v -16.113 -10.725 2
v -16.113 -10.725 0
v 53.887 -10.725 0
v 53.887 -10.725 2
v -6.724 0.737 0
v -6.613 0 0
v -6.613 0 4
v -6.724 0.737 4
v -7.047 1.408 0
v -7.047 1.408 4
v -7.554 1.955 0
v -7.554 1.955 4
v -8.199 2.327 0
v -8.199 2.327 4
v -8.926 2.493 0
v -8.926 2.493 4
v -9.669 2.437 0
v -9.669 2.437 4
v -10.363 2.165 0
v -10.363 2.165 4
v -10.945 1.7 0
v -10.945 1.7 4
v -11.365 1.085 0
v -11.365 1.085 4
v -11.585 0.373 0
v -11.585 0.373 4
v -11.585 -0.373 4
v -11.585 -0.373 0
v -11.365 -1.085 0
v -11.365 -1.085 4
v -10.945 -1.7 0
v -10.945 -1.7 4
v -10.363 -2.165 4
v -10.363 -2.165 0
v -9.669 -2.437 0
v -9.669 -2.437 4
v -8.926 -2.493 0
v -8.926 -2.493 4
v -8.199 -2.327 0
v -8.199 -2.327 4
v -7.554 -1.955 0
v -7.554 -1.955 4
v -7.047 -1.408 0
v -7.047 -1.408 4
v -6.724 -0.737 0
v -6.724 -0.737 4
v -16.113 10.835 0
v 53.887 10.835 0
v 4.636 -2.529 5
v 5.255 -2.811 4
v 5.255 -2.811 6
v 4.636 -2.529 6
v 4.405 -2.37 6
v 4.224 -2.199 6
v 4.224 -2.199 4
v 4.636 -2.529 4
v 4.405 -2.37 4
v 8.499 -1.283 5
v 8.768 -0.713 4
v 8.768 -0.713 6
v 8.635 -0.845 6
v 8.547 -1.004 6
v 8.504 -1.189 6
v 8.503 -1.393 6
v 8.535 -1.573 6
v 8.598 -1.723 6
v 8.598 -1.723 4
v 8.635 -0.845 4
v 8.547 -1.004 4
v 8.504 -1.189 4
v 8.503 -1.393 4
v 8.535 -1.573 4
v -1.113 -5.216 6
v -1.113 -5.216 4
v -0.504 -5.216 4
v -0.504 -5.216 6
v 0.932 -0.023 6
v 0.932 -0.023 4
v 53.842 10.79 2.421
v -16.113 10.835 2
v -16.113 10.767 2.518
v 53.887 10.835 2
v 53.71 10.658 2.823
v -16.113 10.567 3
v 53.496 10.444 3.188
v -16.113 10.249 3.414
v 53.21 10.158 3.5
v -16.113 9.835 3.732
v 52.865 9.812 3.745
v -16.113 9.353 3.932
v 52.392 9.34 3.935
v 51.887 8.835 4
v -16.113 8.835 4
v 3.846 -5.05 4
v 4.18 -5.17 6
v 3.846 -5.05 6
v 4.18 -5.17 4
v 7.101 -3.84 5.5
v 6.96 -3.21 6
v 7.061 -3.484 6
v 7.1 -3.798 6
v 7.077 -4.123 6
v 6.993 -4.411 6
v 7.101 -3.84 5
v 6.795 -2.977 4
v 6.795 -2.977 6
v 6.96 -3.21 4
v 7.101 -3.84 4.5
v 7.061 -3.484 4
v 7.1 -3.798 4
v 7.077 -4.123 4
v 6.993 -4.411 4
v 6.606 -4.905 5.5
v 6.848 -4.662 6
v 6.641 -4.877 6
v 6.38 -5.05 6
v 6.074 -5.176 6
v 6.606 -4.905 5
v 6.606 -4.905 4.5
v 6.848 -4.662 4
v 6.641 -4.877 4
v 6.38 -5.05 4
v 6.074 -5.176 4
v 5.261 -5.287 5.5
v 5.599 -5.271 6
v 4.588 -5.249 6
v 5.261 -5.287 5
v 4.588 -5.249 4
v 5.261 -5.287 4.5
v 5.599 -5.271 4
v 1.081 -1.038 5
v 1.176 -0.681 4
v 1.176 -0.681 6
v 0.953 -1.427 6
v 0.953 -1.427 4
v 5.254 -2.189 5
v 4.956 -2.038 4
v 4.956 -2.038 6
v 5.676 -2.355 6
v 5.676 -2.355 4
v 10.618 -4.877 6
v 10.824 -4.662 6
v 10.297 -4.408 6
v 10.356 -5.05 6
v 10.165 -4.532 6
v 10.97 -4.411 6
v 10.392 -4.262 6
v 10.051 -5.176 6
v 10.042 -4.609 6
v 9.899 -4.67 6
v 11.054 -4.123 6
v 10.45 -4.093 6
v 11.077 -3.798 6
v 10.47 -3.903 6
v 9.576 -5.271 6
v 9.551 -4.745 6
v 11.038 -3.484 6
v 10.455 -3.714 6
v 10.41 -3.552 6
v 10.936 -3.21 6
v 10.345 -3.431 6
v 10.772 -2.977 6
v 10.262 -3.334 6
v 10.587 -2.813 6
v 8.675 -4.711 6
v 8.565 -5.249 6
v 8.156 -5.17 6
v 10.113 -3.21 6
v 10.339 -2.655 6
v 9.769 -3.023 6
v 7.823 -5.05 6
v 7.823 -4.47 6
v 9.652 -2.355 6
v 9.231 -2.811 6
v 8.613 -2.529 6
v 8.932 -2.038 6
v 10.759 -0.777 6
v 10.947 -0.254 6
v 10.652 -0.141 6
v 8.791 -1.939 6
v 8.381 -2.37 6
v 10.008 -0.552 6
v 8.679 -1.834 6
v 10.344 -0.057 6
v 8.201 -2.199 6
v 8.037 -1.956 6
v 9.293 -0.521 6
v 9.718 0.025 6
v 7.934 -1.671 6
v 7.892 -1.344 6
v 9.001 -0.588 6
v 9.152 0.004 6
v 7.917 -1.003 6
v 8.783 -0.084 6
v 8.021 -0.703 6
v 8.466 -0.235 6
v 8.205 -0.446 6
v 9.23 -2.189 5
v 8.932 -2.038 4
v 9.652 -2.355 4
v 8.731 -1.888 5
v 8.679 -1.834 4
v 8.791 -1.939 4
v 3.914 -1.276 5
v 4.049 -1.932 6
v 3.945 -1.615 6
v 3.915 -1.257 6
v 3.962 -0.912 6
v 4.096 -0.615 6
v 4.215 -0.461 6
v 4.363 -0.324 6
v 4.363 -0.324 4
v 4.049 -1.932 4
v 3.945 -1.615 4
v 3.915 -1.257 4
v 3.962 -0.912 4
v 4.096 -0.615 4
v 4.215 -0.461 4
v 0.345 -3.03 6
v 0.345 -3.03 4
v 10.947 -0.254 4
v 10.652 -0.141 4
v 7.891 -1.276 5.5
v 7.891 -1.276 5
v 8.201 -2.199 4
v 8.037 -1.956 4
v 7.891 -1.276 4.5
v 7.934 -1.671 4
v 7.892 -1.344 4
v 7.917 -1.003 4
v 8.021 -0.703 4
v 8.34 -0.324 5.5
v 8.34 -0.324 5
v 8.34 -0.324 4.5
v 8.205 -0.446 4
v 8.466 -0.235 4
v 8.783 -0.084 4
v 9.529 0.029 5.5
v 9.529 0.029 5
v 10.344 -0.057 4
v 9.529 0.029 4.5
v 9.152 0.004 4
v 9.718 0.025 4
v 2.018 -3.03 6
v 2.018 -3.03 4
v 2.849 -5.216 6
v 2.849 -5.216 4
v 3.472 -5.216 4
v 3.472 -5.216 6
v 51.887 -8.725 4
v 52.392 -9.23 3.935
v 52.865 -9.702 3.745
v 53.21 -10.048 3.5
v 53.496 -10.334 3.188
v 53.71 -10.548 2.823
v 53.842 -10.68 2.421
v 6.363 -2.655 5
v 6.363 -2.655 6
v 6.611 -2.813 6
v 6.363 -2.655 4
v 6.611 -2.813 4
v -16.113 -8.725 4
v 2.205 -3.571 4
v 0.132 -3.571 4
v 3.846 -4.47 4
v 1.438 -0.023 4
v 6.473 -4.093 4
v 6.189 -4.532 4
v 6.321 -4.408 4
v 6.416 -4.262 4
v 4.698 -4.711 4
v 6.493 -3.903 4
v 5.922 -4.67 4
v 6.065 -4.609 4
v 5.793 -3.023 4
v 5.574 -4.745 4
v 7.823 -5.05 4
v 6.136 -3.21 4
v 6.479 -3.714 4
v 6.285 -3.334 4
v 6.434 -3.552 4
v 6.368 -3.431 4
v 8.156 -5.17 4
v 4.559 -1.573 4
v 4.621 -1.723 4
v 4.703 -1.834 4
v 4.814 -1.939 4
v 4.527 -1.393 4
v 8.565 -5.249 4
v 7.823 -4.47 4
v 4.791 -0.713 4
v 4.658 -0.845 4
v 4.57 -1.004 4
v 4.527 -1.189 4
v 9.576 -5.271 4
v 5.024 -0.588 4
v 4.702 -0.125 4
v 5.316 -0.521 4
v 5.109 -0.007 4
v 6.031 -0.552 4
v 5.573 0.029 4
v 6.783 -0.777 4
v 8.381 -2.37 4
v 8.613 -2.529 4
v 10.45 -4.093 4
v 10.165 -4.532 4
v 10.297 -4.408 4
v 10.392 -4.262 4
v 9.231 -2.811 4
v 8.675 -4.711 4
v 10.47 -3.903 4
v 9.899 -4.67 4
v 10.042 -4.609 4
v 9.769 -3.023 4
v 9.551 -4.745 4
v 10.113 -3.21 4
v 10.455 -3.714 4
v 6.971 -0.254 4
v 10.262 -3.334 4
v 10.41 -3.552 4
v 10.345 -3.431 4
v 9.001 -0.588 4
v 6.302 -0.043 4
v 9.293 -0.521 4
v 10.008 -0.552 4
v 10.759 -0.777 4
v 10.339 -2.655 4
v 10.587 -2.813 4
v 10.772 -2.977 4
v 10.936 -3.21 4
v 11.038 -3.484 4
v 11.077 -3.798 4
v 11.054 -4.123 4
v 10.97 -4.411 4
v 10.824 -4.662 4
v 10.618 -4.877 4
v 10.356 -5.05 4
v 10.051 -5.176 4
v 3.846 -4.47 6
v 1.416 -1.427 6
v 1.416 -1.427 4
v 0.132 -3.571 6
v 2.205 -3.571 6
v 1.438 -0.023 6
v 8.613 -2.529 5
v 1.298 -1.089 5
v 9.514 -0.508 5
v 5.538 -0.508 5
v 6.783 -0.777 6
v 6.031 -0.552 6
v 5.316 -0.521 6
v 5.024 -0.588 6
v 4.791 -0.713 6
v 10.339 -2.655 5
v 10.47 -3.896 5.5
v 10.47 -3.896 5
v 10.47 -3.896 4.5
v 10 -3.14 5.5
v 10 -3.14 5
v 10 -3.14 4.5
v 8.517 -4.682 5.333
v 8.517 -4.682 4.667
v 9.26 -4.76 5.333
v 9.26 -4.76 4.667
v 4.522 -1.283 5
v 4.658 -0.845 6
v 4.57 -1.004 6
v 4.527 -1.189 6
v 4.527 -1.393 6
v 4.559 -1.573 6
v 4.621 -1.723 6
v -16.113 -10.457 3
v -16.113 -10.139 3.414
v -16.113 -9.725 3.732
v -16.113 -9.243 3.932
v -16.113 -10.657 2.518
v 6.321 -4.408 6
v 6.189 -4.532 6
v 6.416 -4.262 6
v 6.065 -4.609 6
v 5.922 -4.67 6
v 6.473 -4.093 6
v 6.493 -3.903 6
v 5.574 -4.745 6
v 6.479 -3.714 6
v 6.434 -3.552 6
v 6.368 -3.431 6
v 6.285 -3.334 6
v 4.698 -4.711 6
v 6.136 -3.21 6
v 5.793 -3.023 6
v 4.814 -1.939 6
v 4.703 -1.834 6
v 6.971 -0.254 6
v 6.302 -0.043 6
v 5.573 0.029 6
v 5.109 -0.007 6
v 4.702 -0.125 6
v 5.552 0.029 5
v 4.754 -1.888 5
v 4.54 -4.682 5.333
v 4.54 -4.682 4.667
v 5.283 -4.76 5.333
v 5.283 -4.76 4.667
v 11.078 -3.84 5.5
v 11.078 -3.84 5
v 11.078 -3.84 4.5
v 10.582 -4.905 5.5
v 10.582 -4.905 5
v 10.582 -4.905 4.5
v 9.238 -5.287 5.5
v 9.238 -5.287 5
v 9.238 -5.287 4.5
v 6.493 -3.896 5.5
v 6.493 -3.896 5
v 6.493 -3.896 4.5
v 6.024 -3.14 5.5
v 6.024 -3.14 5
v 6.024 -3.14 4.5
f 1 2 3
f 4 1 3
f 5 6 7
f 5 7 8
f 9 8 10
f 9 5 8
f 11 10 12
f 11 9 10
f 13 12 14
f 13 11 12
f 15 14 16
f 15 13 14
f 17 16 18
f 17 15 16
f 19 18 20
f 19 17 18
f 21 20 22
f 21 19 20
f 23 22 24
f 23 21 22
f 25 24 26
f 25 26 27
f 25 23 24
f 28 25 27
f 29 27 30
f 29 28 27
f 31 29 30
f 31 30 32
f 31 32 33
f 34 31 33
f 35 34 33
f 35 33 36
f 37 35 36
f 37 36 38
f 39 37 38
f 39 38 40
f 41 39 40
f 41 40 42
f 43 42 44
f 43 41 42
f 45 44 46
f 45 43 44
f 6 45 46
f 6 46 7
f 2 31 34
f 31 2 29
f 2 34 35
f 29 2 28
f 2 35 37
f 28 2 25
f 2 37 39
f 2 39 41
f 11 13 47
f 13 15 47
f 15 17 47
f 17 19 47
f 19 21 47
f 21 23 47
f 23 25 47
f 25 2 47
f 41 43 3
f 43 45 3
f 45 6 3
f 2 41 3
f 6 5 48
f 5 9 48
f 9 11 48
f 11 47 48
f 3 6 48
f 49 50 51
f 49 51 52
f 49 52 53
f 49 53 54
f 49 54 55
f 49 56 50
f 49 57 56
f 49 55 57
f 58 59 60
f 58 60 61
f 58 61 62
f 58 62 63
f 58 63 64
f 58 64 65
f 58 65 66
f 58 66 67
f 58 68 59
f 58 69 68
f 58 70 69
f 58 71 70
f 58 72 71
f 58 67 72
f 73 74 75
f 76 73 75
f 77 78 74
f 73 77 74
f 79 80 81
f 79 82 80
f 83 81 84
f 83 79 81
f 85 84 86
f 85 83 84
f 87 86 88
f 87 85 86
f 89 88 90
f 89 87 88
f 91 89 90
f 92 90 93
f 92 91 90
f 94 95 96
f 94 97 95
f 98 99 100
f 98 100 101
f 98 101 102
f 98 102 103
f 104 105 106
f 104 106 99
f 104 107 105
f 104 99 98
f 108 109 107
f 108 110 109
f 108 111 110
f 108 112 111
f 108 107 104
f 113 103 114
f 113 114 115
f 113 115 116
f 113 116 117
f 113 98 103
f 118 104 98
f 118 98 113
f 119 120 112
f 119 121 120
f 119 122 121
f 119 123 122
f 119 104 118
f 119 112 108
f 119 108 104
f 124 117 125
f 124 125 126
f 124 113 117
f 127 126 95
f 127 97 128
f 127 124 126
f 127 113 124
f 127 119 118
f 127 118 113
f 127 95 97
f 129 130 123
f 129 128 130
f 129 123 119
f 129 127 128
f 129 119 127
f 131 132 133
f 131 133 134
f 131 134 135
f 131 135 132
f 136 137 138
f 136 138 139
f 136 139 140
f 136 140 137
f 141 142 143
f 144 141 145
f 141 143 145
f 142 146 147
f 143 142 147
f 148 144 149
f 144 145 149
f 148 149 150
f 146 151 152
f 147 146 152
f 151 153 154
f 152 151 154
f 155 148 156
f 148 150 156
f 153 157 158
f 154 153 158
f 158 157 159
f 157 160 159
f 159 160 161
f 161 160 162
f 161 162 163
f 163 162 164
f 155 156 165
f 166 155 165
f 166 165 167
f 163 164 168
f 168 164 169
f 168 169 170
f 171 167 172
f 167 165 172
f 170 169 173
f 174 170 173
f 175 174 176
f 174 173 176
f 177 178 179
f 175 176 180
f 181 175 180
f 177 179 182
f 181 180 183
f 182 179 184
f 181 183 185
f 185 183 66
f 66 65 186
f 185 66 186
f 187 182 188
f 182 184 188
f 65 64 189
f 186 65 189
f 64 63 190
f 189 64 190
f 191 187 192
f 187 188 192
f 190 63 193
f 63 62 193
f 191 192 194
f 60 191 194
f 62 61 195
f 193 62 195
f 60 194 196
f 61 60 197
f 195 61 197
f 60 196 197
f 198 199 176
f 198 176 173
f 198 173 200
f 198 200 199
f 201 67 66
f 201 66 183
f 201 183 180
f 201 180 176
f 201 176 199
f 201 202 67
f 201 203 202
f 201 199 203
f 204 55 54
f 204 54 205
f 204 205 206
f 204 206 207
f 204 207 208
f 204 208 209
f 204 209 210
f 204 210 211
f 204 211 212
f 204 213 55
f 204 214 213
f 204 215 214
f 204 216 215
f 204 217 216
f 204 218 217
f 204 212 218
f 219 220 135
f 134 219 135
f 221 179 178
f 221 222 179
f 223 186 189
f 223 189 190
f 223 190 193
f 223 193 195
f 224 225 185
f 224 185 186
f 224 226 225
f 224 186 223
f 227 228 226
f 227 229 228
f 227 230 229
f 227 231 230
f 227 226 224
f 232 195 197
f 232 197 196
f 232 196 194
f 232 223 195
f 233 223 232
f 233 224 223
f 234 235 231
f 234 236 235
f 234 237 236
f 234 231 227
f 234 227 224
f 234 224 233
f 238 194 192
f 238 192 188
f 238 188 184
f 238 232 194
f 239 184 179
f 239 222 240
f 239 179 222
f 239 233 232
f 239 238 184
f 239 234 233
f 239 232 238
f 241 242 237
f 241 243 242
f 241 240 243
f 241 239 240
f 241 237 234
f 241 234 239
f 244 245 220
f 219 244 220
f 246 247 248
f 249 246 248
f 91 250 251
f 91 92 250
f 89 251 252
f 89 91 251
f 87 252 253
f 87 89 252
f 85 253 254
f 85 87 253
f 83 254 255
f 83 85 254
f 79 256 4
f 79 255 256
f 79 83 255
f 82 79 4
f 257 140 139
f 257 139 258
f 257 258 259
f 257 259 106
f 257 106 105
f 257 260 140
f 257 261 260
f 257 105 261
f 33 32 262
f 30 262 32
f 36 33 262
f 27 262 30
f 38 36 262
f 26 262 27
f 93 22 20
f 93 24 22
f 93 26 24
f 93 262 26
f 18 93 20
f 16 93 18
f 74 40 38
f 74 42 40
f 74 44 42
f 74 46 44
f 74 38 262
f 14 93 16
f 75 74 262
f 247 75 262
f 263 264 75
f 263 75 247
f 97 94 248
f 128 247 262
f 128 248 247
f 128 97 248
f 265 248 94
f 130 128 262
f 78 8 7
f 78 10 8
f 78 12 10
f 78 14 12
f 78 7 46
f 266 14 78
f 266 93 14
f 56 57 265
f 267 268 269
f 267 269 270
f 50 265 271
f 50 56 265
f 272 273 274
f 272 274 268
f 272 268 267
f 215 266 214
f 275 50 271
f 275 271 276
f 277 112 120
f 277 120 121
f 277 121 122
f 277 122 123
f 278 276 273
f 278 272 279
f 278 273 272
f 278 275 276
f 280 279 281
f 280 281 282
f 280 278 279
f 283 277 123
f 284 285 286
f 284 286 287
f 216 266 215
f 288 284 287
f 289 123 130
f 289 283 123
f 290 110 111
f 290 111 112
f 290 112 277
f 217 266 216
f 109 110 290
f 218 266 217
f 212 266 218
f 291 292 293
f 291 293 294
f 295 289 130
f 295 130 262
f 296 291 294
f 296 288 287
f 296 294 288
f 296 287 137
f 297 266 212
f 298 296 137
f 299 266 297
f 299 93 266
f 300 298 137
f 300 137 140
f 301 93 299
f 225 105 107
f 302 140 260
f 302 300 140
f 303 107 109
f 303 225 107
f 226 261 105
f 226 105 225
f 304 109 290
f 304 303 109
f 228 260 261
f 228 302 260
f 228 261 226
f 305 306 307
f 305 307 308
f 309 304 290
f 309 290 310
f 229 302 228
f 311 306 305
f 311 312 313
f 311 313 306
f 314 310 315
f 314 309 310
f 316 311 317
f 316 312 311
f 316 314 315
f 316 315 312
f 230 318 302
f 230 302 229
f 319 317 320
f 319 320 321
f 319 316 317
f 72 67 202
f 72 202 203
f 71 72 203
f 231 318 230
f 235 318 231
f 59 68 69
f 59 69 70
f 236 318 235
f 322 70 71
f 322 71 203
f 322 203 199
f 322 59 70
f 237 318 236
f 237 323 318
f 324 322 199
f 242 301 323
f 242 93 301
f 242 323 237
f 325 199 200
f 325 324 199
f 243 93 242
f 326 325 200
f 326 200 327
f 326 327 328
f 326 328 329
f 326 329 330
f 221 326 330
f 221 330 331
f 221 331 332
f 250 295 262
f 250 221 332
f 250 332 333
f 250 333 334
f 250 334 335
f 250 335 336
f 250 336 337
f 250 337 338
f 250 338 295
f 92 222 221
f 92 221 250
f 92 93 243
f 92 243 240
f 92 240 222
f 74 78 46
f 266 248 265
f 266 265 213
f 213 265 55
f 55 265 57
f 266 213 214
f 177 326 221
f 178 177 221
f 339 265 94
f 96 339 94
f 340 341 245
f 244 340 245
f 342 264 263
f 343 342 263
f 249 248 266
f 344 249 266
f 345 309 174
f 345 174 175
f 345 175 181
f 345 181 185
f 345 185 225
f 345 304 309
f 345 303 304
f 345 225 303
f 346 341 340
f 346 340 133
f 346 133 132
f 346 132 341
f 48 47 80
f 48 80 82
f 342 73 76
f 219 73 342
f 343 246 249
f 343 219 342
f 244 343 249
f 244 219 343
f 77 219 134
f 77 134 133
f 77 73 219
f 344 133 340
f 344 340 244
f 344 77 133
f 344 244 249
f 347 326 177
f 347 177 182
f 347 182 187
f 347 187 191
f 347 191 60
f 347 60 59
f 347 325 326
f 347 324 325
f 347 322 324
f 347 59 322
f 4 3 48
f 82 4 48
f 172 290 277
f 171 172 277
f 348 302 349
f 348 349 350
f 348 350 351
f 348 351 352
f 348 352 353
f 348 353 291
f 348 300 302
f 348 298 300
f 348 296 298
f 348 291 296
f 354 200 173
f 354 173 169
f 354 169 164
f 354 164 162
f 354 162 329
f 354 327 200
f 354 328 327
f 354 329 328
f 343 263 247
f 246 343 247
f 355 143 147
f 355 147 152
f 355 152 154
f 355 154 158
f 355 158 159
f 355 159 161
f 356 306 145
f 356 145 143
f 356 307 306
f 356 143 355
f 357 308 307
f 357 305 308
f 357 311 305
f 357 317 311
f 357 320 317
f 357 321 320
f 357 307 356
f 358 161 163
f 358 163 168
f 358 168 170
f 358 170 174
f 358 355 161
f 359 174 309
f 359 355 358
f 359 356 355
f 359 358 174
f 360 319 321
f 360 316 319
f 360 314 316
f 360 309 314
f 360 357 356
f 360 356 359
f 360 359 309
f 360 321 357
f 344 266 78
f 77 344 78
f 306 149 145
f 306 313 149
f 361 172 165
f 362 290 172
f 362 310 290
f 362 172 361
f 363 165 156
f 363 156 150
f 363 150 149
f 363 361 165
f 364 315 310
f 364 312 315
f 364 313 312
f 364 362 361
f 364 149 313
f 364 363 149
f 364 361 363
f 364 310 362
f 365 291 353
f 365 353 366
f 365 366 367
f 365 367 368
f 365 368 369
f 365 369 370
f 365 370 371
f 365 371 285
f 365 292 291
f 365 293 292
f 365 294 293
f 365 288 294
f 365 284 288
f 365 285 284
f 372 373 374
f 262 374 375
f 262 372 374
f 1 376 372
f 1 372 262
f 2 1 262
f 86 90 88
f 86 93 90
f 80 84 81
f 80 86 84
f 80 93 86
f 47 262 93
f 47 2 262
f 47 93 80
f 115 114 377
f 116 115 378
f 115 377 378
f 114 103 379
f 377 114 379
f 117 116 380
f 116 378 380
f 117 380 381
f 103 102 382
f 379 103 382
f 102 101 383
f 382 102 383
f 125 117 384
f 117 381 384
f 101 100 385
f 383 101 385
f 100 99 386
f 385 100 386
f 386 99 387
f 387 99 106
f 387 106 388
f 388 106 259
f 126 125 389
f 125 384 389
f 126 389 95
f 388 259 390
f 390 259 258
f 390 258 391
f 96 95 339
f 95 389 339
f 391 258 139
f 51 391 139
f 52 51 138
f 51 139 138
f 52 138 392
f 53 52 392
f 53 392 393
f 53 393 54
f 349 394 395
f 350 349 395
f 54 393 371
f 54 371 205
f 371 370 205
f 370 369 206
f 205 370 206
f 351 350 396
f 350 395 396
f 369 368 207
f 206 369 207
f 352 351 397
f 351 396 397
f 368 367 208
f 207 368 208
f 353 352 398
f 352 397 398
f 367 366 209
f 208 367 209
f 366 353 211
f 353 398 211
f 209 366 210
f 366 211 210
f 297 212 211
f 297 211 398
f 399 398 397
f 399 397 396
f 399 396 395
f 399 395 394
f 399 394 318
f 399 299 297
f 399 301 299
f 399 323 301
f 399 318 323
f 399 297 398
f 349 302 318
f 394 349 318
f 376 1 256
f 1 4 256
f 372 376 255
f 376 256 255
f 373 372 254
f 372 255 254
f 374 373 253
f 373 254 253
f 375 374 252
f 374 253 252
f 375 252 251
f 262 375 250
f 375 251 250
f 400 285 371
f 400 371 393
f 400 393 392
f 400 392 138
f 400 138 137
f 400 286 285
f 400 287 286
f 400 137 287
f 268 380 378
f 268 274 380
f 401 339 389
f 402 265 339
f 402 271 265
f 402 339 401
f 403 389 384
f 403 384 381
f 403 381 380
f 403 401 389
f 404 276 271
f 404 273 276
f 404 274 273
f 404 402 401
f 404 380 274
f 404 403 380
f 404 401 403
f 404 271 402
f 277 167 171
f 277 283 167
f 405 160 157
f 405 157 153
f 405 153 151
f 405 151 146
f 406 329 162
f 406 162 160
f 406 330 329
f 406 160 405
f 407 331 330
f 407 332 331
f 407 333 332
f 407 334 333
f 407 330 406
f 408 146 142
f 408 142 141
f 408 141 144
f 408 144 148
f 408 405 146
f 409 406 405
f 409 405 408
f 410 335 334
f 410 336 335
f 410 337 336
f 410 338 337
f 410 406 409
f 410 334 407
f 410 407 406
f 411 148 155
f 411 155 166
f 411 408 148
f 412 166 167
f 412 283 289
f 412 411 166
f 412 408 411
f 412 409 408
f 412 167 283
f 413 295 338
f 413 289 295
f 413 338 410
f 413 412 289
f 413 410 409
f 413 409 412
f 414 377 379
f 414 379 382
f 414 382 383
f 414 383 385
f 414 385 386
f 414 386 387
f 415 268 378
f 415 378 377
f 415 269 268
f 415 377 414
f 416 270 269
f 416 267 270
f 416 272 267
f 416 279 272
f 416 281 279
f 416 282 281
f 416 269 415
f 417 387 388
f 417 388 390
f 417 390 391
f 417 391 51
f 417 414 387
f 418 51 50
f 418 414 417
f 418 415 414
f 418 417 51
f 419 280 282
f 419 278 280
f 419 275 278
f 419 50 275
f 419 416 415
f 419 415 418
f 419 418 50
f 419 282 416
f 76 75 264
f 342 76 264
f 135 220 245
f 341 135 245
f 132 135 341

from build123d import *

# Parameters (mm, degrees)
F0_W     = 70
F0_H     = 21.5599828357
F0_R     = 2.5
F1_DEPTH = 4
F3_DEPTH = 2
F4_R     = 2


with BuildPart() as f1:
    # F0 (on Top) → F1 (new body)
    with BuildSketch(Plane.XY):
        with Locations((18.8872945234, 0.0549508259)):
            Rectangle(F0_W, F0_H)
        with Locations((-9.1127054766, 0)):
            Circle(F0_R, mode=Mode.SUBTRACT)
    extrude(amount=F1_DEPTH)

    # F2 (on face) → F3 (join)
    with BuildSketch(Plane.XY.offset(4)):
        Polygon((2.2051139605, -3.5713818915), (2.8492078737, -5.2161419195), (3.4717942573, -5.2161419195), (1.4376347458, -0.0226395049), (0.9316418122, -0.0226395049), (-1.1127054766, -5.2161419195), (-0.5037027959, -5.2161419195), (0.1324672907, -3.5713818915), align=None)
        with BuildLine():
            Line((1.4161272162, -1.4274207814), (2.0183380454, -3.0302977254))
            Line((2.0183380454, -3.0302977254), (0.3452786363, -3.0302977254))
            Line((0.3452786363, -3.0302977254), (0.9531493418, -1.4274207814))
            add(Edge.make_bspline(
                [(1.1761484646, -0.6814490963), (1.0980421729, -1.0210416691), (0.9531493418, -1.4274207814)],
                knots=[0, 0, 0, 1, 1, 1], degree=2))
            add(Edge.make_bspline(
                [(1.4161272162, -1.4274207814), (1.2995337661, -1.122919441), (1.1761484646, -0.6814490963)],
                knots=[0, 0, 0, 1, 1, 1], degree=2))
        make_face(mode=Mode.SUBTRACT)
        with BuildLine():
            add(Edge.make_bspline(
                [(7.1009068862, -3.8396600241), (7.1009068862, -4.5222410956), (6.6056677174, -4.9048487277)],
                knots=[0, 0, 0, 1, 1, 1], degree=2))
            add(Edge.make_bspline(
                [(6.7952735706, -2.9770948889), (7.1009068862, -3.3098956104), (7.1009068862, -3.8396600241)],
                knots=[0, 0, 0, 1, 1, 1], degree=2))
            add(Edge.make_bspline(
                [(5.6757500553, -2.3545085053), (6.489640255, -2.6442941675), (6.7952735706, -2.9770948889)],
                knots=[0, 0, 0, 1, 1, 1], degree=2))
            add(Edge.make_bspline(
                [(4.9558138008, -2.0381214249), (5.1912646514, -2.1813162932), (5.6757500553, -2.3545085053)],
                knots=[0, 0, 0, 1, 1, 1], degree=2))
            add(Edge.make_bspline(
                [(4.6213151165, -1.7228663198), (4.7203629503, -1.8949265567), (4.9558138008, -2.0381214249)],
                knots=[0, 0, 0, 1, 1, 1], degree=2))
            add(Edge.make_bspline(
                [(4.5222672828, -1.2825279503), (4.5222672828, -1.5508060828), (4.6213151165, -1.7228663198)],
                knots=[0, 0, 0, 1, 1, 1], degree=2))
            add(Edge.make_bspline(
                [(4.791111403, -0.7131444031), (4.5222672828, -0.918031922), (4.5222672828, -1.2825279503)],
                knots=[0, 0, 0, 1, 1, 1], degree=2))
            add(Edge.make_bspline(
                [(5.5376490757, -0.5082568841), (5.0599555232, -0.5082568841), (4.791111403, -0.7131444031)],
                knots=[0, 0, 0, 1, 1, 1], degree=2))
            add(Edge.make_bspline(
                [(6.7828218429, -0.7765350167), (6.1421238554, -0.5082568841), (5.5376490757, -0.5082568841)],
                knots=[0, 0, 0, 1, 1, 1], degree=2))
            Line((6.7828218429, -0.7765350167), (6.9707297333, -0.2535624544))
            add(Edge.make_bspline(
                [(5.5523647539, 0.0294313563), (6.3232398943, 0.0294313563), (6.9707297333, -0.2535624544)],
                knots=[0, 0, 0, 1, 1, 1], degree=2))
            add(Edge.make_bspline(
                [(4.3632247612, -0.3243109071), (4.812052945, 0.0294313563), (5.5523647539, 0.0294313563)],
                knots=[0, 0, 0, 1, 1, 1], degree=2))
            add(Edge.make_bspline(
                [(3.9143965773, -1.2757360988), (3.9143965773, -0.6780531705), (4.3632247612, -0.3243109071)],
                knots=[0, 0, 0, 1, 1, 1], degree=2))
            add(Edge.make_bspline(
                [(4.2239918063, -2.1988619094), (3.9143965773, -1.845119646), (3.9143965773, -1.2757360988)],
                knots=[0, 0, 0, 1, 1, 1], degree=2))
            add(Edge.make_bspline(
                [(5.254655265, -2.8106945282), (4.5335870352, -2.5526041728), (4.2239918063, -2.1988619094)],
                knots=[0, 0, 0, 1, 1, 1], degree=2))
            add(Edge.make_bspline(
                [(6.0238324426, -3.1395333363), (5.7708359758, -2.9940745176), (5.254655265, -2.8106945282)],
                knots=[0, 0, 0, 1, 1, 1], degree=2))
            add(Edge.make_bspline(
                [(6.3849325451, -3.4564864043), (6.2768289094, -3.284992155), (6.0238324426, -3.1395333363)],
                knots=[0, 0, 0, 1, 1, 1], degree=2))
            add(Edge.make_bspline(
                [(6.4930361808, -3.8962587862), (6.4930361808, -3.6279806536), (6.3849325451, -3.4564864043)],
                knots=[0, 0, 0, 1, 1, 1], degree=2))
            add(Edge.make_bspline(
                [(6.1885348404, -4.5318628851), (6.4930361808, -4.3037698737), (6.4930361808, -3.8962587862)],
                knots=[0, 0, 0, 1, 1, 1], degree=2))
            add(Edge.make_bspline(
                [(5.282954646, -4.7599558966), (5.8840335, -4.7599558966), (6.1885348404, -4.5318628851)],
                knots=[0, 0, 0, 1, 1, 1], degree=2))
            add(Edge.make_bspline(
                [(4.5403788867, -4.6818496048), (4.9150626921, -4.7599558966), (5.282954646, -4.7599558966)],
                knots=[0, 0, 0, 1, 1, 1], degree=2))
            add(Edge.make_bspline(
                [(3.8464780628, -4.4701702344), (4.1656950813, -4.603743313), (4.5403788867, -4.6818496048)],
                knots=[0, 0, 0, 1, 1, 1], degree=2))
            Line((3.8464780628, -4.4701702344), (3.8464780628, -5.0497415588))
            add(Edge.make_bspline(
                [(5.2614471164, -5.2874563598), (4.3422832192, -5.2874563598), (3.8464780628, -5.0497415588)],
                knots=[0, 0, 0, 1, 1, 1], degree=2))
            add(Edge.make_bspline(
                [(6.6056677174, -4.9048487277), (6.1104285486, -5.2874563598), (5.2614471164, -5.2874563598)],
                knots=[0, 0, 0, 1, 1, 1], degree=2))
        make_face()
        with BuildLine():
            add(Edge.make_bspline(
                [(11.0775359147, -3.8396600241), (11.0775359147, -4.5222410956), (10.5822967459, -4.9048487277)],
                knots=[0, 0, 0, 1, 1, 1], degree=2))
            add(Edge.make_bspline(
                [(10.7719025991, -2.9770948889), (11.0775359147, -3.3098956104), (11.0775359147, -3.8396600241)],
                knots=[0, 0, 0, 1, 1, 1], degree=2))
            add(Edge.make_bspline(
                [(9.6523790838, -2.3545085053), (10.4662692835, -2.6442941675), (10.7719025991, -2.9770948889)],
                knots=[0, 0, 0, 1, 1, 1], degree=2))
            add(Edge.make_bspline(
                [(8.9324428293, -2.0381214249), (9.1678936798, -2.1813162932), (9.6523790838, -2.3545085053)],
                knots=[0, 0, 0, 1, 1, 1], degree=2))
            add(Edge.make_bspline(
                [(8.597944145, -1.7228663198), (8.6969919788, -1.8949265567), (8.9324428293, -2.0381214249)],
                knots=[0, 0, 0, 1, 1, 1], degree=2))
            add(Edge.make_bspline(
                [(8.4988963112, -1.2825279503), (8.4988963112, -1.5508060828), (8.597944145, -1.7228663198)],
                knots=[0, 0, 0, 1, 1, 1], degree=2))
            add(Edge.make_bspline(
                [(8.7677404314, -0.7131444031), (8.4988963112, -0.918031922), (8.4988963112, -1.2825279503)],
                knots=[0, 0, 0, 1, 1, 1], degree=2))
            add(Edge.make_bspline(
                [(9.5142781042, -0.5082568841), (9.0365845516, -0.5082568841), (8.7677404314, -0.7131444031)],
                knots=[0, 0, 0, 1, 1, 1], degree=2))
            add(Edge.make_bspline(
                [(10.7594508714, -0.7765350167), (10.1187528839, -0.5082568841), (9.5142781042, -0.5082568841)],
                knots=[0, 0, 0, 1, 1, 1], degree=2))
            Line((10.7594508714, -0.7765350167), (10.9473587617, -0.2535624544))
            add(Edge.make_bspline(
                [(9.5289937823, 0.0294313563), (10.2998689228, 0.0294313563), (10.9473587617, -0.2535624544)],
                knots=[0, 0, 0, 1, 1, 1], degree=2))
            add(Edge.make_bspline(
                [(8.3398537896, -0.3243109071), (8.7886819734, 0.0294313563), (9.5289937823, 0.0294313563)],
                knots=[0, 0, 0, 1, 1, 1], degree=2))
            add(Edge.make_bspline(
                [(7.8910256058, -1.2757360988), (7.8910256058, -0.6780531705), (8.3398537896, -0.3243109071)],
                knots=[0, 0, 0, 1, 1, 1], degree=2))
            add(Edge.make_bspline(
                [(8.2006208347, -2.1988619094), (7.8910256058, -1.845119646), (7.8910256058, -1.2757360988)],
                knots=[0, 0, 0, 1, 1, 1], degree=2))
            add(Edge.make_bspline(
                [(9.2312842934, -2.8106945282), (8.5102160637, -2.5526041728), (8.2006208347, -2.1988619094)],
                knots=[0, 0, 0, 1, 1, 1], degree=2))
            add(Edge.make_bspline(
                [(10.000461471, -3.1395333363), (9.7474650042, -2.9940745176), (9.2312842934, -2.8106945282)],
                knots=[0, 0, 0, 1, 1, 1], degree=2))
            add(Edge.make_bspline(
                [(10.3615615735, -3.4564864043), (10.2534579378, -3.284992155), (10.000461471, -3.1395333363)],
                knots=[0, 0, 0, 1, 1, 1], degree=2))
            add(Edge.make_bspline(
                [(10.4696652092, -3.8962587862), (10.4696652092, -3.6279806536), (10.3615615735, -3.4564864043)],
                knots=[0, 0, 0, 1, 1, 1], degree=2))
            add(Edge.make_bspline(
                [(10.1651638689, -4.5318628851), (10.4696652092, -4.3037698737), (10.4696652092, -3.8962587862)],
                knots=[0, 0, 0, 1, 1, 1], degree=2))
            add(Edge.make_bspline(
                [(9.2595836745, -4.7599558966), (9.8606625285, -4.7599558966), (10.1651638689, -4.5318628851)],
                knots=[0, 0, 0, 1, 1, 1], degree=2))
            add(Edge.make_bspline(
                [(8.5170079151, -4.6818496048), (8.8916917205, -4.7599558966), (9.2595836745, -4.7599558966)],
                knots=[0, 0, 0, 1, 1, 1], degree=2))
            add(Edge.make_bspline(
                [(7.8231070912, -4.4701702344), (8.1423241097, -4.603743313), (8.5170079151, -4.6818496048)],
                knots=[0, 0, 0, 1, 1, 1], degree=2))
            Line((7.8231070912, -4.4701702344), (7.8231070912, -5.0497415588))
            add(Edge.make_bspline(
                [(9.2380761449, -5.2874563598), (8.3189122476, -5.2874563598), (7.8231070912, -5.0497415588)],
                knots=[0, 0, 0, 1, 1, 1], degree=2))
            add(Edge.make_bspline(
                [(10.5822967459, -4.9048487277), (10.0870575771, -5.2874563598), (9.2380761449, -5.2874563598)],
                knots=[0, 0, 0, 1, 1, 1], degree=2))
        make_face()
    extrude(amount=F3_DEPTH)

    # F4
    f4_edges = [f1.edges().sort_by_distance(p)[0] for p in [
        (18.887295, -10.725041, 4),
        (18.887295, 10.834942, 4),
        (53.887295, 0.054951, 4),
    ]]
    fillet(f4_edges, radius=F4_R)


solid = f1.part
